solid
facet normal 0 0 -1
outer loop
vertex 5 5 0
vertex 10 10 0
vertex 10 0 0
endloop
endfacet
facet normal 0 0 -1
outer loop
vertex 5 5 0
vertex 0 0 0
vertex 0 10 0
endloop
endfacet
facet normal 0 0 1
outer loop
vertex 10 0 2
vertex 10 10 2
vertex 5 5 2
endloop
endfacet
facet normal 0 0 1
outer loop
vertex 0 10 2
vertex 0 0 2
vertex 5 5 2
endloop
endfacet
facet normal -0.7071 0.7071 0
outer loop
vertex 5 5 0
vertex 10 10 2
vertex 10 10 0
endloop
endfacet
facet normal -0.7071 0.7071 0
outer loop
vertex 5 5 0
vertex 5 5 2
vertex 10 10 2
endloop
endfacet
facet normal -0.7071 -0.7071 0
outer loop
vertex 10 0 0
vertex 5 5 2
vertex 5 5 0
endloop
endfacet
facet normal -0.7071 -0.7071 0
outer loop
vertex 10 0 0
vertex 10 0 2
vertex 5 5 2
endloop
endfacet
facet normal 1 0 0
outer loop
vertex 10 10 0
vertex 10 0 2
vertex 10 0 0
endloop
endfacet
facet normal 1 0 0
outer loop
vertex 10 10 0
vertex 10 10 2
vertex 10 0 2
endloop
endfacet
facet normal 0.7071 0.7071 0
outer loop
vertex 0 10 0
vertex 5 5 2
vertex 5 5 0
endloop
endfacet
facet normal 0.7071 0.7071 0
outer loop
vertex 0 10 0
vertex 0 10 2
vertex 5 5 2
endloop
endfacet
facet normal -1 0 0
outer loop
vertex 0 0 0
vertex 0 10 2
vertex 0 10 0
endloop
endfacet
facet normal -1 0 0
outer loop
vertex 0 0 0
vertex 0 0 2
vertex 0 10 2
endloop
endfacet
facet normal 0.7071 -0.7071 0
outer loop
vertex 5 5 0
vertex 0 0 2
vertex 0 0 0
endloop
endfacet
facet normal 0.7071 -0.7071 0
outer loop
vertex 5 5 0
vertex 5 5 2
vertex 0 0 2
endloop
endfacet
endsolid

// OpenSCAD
// a self-crossing outline is filled even-odd: a bow tie is its two triangles (it used to build as a
// zero-volume sheet hanging below z = 0). Alone in its file: OpenSCAD's CGAL render (the oracle) DROPS a
// self-crossing polygon once it is unioned with anything else — its Manifold render keeps it.
linear_extrude(2) polygon([[0,0],[10,10],[10,0],[0,10]]);
